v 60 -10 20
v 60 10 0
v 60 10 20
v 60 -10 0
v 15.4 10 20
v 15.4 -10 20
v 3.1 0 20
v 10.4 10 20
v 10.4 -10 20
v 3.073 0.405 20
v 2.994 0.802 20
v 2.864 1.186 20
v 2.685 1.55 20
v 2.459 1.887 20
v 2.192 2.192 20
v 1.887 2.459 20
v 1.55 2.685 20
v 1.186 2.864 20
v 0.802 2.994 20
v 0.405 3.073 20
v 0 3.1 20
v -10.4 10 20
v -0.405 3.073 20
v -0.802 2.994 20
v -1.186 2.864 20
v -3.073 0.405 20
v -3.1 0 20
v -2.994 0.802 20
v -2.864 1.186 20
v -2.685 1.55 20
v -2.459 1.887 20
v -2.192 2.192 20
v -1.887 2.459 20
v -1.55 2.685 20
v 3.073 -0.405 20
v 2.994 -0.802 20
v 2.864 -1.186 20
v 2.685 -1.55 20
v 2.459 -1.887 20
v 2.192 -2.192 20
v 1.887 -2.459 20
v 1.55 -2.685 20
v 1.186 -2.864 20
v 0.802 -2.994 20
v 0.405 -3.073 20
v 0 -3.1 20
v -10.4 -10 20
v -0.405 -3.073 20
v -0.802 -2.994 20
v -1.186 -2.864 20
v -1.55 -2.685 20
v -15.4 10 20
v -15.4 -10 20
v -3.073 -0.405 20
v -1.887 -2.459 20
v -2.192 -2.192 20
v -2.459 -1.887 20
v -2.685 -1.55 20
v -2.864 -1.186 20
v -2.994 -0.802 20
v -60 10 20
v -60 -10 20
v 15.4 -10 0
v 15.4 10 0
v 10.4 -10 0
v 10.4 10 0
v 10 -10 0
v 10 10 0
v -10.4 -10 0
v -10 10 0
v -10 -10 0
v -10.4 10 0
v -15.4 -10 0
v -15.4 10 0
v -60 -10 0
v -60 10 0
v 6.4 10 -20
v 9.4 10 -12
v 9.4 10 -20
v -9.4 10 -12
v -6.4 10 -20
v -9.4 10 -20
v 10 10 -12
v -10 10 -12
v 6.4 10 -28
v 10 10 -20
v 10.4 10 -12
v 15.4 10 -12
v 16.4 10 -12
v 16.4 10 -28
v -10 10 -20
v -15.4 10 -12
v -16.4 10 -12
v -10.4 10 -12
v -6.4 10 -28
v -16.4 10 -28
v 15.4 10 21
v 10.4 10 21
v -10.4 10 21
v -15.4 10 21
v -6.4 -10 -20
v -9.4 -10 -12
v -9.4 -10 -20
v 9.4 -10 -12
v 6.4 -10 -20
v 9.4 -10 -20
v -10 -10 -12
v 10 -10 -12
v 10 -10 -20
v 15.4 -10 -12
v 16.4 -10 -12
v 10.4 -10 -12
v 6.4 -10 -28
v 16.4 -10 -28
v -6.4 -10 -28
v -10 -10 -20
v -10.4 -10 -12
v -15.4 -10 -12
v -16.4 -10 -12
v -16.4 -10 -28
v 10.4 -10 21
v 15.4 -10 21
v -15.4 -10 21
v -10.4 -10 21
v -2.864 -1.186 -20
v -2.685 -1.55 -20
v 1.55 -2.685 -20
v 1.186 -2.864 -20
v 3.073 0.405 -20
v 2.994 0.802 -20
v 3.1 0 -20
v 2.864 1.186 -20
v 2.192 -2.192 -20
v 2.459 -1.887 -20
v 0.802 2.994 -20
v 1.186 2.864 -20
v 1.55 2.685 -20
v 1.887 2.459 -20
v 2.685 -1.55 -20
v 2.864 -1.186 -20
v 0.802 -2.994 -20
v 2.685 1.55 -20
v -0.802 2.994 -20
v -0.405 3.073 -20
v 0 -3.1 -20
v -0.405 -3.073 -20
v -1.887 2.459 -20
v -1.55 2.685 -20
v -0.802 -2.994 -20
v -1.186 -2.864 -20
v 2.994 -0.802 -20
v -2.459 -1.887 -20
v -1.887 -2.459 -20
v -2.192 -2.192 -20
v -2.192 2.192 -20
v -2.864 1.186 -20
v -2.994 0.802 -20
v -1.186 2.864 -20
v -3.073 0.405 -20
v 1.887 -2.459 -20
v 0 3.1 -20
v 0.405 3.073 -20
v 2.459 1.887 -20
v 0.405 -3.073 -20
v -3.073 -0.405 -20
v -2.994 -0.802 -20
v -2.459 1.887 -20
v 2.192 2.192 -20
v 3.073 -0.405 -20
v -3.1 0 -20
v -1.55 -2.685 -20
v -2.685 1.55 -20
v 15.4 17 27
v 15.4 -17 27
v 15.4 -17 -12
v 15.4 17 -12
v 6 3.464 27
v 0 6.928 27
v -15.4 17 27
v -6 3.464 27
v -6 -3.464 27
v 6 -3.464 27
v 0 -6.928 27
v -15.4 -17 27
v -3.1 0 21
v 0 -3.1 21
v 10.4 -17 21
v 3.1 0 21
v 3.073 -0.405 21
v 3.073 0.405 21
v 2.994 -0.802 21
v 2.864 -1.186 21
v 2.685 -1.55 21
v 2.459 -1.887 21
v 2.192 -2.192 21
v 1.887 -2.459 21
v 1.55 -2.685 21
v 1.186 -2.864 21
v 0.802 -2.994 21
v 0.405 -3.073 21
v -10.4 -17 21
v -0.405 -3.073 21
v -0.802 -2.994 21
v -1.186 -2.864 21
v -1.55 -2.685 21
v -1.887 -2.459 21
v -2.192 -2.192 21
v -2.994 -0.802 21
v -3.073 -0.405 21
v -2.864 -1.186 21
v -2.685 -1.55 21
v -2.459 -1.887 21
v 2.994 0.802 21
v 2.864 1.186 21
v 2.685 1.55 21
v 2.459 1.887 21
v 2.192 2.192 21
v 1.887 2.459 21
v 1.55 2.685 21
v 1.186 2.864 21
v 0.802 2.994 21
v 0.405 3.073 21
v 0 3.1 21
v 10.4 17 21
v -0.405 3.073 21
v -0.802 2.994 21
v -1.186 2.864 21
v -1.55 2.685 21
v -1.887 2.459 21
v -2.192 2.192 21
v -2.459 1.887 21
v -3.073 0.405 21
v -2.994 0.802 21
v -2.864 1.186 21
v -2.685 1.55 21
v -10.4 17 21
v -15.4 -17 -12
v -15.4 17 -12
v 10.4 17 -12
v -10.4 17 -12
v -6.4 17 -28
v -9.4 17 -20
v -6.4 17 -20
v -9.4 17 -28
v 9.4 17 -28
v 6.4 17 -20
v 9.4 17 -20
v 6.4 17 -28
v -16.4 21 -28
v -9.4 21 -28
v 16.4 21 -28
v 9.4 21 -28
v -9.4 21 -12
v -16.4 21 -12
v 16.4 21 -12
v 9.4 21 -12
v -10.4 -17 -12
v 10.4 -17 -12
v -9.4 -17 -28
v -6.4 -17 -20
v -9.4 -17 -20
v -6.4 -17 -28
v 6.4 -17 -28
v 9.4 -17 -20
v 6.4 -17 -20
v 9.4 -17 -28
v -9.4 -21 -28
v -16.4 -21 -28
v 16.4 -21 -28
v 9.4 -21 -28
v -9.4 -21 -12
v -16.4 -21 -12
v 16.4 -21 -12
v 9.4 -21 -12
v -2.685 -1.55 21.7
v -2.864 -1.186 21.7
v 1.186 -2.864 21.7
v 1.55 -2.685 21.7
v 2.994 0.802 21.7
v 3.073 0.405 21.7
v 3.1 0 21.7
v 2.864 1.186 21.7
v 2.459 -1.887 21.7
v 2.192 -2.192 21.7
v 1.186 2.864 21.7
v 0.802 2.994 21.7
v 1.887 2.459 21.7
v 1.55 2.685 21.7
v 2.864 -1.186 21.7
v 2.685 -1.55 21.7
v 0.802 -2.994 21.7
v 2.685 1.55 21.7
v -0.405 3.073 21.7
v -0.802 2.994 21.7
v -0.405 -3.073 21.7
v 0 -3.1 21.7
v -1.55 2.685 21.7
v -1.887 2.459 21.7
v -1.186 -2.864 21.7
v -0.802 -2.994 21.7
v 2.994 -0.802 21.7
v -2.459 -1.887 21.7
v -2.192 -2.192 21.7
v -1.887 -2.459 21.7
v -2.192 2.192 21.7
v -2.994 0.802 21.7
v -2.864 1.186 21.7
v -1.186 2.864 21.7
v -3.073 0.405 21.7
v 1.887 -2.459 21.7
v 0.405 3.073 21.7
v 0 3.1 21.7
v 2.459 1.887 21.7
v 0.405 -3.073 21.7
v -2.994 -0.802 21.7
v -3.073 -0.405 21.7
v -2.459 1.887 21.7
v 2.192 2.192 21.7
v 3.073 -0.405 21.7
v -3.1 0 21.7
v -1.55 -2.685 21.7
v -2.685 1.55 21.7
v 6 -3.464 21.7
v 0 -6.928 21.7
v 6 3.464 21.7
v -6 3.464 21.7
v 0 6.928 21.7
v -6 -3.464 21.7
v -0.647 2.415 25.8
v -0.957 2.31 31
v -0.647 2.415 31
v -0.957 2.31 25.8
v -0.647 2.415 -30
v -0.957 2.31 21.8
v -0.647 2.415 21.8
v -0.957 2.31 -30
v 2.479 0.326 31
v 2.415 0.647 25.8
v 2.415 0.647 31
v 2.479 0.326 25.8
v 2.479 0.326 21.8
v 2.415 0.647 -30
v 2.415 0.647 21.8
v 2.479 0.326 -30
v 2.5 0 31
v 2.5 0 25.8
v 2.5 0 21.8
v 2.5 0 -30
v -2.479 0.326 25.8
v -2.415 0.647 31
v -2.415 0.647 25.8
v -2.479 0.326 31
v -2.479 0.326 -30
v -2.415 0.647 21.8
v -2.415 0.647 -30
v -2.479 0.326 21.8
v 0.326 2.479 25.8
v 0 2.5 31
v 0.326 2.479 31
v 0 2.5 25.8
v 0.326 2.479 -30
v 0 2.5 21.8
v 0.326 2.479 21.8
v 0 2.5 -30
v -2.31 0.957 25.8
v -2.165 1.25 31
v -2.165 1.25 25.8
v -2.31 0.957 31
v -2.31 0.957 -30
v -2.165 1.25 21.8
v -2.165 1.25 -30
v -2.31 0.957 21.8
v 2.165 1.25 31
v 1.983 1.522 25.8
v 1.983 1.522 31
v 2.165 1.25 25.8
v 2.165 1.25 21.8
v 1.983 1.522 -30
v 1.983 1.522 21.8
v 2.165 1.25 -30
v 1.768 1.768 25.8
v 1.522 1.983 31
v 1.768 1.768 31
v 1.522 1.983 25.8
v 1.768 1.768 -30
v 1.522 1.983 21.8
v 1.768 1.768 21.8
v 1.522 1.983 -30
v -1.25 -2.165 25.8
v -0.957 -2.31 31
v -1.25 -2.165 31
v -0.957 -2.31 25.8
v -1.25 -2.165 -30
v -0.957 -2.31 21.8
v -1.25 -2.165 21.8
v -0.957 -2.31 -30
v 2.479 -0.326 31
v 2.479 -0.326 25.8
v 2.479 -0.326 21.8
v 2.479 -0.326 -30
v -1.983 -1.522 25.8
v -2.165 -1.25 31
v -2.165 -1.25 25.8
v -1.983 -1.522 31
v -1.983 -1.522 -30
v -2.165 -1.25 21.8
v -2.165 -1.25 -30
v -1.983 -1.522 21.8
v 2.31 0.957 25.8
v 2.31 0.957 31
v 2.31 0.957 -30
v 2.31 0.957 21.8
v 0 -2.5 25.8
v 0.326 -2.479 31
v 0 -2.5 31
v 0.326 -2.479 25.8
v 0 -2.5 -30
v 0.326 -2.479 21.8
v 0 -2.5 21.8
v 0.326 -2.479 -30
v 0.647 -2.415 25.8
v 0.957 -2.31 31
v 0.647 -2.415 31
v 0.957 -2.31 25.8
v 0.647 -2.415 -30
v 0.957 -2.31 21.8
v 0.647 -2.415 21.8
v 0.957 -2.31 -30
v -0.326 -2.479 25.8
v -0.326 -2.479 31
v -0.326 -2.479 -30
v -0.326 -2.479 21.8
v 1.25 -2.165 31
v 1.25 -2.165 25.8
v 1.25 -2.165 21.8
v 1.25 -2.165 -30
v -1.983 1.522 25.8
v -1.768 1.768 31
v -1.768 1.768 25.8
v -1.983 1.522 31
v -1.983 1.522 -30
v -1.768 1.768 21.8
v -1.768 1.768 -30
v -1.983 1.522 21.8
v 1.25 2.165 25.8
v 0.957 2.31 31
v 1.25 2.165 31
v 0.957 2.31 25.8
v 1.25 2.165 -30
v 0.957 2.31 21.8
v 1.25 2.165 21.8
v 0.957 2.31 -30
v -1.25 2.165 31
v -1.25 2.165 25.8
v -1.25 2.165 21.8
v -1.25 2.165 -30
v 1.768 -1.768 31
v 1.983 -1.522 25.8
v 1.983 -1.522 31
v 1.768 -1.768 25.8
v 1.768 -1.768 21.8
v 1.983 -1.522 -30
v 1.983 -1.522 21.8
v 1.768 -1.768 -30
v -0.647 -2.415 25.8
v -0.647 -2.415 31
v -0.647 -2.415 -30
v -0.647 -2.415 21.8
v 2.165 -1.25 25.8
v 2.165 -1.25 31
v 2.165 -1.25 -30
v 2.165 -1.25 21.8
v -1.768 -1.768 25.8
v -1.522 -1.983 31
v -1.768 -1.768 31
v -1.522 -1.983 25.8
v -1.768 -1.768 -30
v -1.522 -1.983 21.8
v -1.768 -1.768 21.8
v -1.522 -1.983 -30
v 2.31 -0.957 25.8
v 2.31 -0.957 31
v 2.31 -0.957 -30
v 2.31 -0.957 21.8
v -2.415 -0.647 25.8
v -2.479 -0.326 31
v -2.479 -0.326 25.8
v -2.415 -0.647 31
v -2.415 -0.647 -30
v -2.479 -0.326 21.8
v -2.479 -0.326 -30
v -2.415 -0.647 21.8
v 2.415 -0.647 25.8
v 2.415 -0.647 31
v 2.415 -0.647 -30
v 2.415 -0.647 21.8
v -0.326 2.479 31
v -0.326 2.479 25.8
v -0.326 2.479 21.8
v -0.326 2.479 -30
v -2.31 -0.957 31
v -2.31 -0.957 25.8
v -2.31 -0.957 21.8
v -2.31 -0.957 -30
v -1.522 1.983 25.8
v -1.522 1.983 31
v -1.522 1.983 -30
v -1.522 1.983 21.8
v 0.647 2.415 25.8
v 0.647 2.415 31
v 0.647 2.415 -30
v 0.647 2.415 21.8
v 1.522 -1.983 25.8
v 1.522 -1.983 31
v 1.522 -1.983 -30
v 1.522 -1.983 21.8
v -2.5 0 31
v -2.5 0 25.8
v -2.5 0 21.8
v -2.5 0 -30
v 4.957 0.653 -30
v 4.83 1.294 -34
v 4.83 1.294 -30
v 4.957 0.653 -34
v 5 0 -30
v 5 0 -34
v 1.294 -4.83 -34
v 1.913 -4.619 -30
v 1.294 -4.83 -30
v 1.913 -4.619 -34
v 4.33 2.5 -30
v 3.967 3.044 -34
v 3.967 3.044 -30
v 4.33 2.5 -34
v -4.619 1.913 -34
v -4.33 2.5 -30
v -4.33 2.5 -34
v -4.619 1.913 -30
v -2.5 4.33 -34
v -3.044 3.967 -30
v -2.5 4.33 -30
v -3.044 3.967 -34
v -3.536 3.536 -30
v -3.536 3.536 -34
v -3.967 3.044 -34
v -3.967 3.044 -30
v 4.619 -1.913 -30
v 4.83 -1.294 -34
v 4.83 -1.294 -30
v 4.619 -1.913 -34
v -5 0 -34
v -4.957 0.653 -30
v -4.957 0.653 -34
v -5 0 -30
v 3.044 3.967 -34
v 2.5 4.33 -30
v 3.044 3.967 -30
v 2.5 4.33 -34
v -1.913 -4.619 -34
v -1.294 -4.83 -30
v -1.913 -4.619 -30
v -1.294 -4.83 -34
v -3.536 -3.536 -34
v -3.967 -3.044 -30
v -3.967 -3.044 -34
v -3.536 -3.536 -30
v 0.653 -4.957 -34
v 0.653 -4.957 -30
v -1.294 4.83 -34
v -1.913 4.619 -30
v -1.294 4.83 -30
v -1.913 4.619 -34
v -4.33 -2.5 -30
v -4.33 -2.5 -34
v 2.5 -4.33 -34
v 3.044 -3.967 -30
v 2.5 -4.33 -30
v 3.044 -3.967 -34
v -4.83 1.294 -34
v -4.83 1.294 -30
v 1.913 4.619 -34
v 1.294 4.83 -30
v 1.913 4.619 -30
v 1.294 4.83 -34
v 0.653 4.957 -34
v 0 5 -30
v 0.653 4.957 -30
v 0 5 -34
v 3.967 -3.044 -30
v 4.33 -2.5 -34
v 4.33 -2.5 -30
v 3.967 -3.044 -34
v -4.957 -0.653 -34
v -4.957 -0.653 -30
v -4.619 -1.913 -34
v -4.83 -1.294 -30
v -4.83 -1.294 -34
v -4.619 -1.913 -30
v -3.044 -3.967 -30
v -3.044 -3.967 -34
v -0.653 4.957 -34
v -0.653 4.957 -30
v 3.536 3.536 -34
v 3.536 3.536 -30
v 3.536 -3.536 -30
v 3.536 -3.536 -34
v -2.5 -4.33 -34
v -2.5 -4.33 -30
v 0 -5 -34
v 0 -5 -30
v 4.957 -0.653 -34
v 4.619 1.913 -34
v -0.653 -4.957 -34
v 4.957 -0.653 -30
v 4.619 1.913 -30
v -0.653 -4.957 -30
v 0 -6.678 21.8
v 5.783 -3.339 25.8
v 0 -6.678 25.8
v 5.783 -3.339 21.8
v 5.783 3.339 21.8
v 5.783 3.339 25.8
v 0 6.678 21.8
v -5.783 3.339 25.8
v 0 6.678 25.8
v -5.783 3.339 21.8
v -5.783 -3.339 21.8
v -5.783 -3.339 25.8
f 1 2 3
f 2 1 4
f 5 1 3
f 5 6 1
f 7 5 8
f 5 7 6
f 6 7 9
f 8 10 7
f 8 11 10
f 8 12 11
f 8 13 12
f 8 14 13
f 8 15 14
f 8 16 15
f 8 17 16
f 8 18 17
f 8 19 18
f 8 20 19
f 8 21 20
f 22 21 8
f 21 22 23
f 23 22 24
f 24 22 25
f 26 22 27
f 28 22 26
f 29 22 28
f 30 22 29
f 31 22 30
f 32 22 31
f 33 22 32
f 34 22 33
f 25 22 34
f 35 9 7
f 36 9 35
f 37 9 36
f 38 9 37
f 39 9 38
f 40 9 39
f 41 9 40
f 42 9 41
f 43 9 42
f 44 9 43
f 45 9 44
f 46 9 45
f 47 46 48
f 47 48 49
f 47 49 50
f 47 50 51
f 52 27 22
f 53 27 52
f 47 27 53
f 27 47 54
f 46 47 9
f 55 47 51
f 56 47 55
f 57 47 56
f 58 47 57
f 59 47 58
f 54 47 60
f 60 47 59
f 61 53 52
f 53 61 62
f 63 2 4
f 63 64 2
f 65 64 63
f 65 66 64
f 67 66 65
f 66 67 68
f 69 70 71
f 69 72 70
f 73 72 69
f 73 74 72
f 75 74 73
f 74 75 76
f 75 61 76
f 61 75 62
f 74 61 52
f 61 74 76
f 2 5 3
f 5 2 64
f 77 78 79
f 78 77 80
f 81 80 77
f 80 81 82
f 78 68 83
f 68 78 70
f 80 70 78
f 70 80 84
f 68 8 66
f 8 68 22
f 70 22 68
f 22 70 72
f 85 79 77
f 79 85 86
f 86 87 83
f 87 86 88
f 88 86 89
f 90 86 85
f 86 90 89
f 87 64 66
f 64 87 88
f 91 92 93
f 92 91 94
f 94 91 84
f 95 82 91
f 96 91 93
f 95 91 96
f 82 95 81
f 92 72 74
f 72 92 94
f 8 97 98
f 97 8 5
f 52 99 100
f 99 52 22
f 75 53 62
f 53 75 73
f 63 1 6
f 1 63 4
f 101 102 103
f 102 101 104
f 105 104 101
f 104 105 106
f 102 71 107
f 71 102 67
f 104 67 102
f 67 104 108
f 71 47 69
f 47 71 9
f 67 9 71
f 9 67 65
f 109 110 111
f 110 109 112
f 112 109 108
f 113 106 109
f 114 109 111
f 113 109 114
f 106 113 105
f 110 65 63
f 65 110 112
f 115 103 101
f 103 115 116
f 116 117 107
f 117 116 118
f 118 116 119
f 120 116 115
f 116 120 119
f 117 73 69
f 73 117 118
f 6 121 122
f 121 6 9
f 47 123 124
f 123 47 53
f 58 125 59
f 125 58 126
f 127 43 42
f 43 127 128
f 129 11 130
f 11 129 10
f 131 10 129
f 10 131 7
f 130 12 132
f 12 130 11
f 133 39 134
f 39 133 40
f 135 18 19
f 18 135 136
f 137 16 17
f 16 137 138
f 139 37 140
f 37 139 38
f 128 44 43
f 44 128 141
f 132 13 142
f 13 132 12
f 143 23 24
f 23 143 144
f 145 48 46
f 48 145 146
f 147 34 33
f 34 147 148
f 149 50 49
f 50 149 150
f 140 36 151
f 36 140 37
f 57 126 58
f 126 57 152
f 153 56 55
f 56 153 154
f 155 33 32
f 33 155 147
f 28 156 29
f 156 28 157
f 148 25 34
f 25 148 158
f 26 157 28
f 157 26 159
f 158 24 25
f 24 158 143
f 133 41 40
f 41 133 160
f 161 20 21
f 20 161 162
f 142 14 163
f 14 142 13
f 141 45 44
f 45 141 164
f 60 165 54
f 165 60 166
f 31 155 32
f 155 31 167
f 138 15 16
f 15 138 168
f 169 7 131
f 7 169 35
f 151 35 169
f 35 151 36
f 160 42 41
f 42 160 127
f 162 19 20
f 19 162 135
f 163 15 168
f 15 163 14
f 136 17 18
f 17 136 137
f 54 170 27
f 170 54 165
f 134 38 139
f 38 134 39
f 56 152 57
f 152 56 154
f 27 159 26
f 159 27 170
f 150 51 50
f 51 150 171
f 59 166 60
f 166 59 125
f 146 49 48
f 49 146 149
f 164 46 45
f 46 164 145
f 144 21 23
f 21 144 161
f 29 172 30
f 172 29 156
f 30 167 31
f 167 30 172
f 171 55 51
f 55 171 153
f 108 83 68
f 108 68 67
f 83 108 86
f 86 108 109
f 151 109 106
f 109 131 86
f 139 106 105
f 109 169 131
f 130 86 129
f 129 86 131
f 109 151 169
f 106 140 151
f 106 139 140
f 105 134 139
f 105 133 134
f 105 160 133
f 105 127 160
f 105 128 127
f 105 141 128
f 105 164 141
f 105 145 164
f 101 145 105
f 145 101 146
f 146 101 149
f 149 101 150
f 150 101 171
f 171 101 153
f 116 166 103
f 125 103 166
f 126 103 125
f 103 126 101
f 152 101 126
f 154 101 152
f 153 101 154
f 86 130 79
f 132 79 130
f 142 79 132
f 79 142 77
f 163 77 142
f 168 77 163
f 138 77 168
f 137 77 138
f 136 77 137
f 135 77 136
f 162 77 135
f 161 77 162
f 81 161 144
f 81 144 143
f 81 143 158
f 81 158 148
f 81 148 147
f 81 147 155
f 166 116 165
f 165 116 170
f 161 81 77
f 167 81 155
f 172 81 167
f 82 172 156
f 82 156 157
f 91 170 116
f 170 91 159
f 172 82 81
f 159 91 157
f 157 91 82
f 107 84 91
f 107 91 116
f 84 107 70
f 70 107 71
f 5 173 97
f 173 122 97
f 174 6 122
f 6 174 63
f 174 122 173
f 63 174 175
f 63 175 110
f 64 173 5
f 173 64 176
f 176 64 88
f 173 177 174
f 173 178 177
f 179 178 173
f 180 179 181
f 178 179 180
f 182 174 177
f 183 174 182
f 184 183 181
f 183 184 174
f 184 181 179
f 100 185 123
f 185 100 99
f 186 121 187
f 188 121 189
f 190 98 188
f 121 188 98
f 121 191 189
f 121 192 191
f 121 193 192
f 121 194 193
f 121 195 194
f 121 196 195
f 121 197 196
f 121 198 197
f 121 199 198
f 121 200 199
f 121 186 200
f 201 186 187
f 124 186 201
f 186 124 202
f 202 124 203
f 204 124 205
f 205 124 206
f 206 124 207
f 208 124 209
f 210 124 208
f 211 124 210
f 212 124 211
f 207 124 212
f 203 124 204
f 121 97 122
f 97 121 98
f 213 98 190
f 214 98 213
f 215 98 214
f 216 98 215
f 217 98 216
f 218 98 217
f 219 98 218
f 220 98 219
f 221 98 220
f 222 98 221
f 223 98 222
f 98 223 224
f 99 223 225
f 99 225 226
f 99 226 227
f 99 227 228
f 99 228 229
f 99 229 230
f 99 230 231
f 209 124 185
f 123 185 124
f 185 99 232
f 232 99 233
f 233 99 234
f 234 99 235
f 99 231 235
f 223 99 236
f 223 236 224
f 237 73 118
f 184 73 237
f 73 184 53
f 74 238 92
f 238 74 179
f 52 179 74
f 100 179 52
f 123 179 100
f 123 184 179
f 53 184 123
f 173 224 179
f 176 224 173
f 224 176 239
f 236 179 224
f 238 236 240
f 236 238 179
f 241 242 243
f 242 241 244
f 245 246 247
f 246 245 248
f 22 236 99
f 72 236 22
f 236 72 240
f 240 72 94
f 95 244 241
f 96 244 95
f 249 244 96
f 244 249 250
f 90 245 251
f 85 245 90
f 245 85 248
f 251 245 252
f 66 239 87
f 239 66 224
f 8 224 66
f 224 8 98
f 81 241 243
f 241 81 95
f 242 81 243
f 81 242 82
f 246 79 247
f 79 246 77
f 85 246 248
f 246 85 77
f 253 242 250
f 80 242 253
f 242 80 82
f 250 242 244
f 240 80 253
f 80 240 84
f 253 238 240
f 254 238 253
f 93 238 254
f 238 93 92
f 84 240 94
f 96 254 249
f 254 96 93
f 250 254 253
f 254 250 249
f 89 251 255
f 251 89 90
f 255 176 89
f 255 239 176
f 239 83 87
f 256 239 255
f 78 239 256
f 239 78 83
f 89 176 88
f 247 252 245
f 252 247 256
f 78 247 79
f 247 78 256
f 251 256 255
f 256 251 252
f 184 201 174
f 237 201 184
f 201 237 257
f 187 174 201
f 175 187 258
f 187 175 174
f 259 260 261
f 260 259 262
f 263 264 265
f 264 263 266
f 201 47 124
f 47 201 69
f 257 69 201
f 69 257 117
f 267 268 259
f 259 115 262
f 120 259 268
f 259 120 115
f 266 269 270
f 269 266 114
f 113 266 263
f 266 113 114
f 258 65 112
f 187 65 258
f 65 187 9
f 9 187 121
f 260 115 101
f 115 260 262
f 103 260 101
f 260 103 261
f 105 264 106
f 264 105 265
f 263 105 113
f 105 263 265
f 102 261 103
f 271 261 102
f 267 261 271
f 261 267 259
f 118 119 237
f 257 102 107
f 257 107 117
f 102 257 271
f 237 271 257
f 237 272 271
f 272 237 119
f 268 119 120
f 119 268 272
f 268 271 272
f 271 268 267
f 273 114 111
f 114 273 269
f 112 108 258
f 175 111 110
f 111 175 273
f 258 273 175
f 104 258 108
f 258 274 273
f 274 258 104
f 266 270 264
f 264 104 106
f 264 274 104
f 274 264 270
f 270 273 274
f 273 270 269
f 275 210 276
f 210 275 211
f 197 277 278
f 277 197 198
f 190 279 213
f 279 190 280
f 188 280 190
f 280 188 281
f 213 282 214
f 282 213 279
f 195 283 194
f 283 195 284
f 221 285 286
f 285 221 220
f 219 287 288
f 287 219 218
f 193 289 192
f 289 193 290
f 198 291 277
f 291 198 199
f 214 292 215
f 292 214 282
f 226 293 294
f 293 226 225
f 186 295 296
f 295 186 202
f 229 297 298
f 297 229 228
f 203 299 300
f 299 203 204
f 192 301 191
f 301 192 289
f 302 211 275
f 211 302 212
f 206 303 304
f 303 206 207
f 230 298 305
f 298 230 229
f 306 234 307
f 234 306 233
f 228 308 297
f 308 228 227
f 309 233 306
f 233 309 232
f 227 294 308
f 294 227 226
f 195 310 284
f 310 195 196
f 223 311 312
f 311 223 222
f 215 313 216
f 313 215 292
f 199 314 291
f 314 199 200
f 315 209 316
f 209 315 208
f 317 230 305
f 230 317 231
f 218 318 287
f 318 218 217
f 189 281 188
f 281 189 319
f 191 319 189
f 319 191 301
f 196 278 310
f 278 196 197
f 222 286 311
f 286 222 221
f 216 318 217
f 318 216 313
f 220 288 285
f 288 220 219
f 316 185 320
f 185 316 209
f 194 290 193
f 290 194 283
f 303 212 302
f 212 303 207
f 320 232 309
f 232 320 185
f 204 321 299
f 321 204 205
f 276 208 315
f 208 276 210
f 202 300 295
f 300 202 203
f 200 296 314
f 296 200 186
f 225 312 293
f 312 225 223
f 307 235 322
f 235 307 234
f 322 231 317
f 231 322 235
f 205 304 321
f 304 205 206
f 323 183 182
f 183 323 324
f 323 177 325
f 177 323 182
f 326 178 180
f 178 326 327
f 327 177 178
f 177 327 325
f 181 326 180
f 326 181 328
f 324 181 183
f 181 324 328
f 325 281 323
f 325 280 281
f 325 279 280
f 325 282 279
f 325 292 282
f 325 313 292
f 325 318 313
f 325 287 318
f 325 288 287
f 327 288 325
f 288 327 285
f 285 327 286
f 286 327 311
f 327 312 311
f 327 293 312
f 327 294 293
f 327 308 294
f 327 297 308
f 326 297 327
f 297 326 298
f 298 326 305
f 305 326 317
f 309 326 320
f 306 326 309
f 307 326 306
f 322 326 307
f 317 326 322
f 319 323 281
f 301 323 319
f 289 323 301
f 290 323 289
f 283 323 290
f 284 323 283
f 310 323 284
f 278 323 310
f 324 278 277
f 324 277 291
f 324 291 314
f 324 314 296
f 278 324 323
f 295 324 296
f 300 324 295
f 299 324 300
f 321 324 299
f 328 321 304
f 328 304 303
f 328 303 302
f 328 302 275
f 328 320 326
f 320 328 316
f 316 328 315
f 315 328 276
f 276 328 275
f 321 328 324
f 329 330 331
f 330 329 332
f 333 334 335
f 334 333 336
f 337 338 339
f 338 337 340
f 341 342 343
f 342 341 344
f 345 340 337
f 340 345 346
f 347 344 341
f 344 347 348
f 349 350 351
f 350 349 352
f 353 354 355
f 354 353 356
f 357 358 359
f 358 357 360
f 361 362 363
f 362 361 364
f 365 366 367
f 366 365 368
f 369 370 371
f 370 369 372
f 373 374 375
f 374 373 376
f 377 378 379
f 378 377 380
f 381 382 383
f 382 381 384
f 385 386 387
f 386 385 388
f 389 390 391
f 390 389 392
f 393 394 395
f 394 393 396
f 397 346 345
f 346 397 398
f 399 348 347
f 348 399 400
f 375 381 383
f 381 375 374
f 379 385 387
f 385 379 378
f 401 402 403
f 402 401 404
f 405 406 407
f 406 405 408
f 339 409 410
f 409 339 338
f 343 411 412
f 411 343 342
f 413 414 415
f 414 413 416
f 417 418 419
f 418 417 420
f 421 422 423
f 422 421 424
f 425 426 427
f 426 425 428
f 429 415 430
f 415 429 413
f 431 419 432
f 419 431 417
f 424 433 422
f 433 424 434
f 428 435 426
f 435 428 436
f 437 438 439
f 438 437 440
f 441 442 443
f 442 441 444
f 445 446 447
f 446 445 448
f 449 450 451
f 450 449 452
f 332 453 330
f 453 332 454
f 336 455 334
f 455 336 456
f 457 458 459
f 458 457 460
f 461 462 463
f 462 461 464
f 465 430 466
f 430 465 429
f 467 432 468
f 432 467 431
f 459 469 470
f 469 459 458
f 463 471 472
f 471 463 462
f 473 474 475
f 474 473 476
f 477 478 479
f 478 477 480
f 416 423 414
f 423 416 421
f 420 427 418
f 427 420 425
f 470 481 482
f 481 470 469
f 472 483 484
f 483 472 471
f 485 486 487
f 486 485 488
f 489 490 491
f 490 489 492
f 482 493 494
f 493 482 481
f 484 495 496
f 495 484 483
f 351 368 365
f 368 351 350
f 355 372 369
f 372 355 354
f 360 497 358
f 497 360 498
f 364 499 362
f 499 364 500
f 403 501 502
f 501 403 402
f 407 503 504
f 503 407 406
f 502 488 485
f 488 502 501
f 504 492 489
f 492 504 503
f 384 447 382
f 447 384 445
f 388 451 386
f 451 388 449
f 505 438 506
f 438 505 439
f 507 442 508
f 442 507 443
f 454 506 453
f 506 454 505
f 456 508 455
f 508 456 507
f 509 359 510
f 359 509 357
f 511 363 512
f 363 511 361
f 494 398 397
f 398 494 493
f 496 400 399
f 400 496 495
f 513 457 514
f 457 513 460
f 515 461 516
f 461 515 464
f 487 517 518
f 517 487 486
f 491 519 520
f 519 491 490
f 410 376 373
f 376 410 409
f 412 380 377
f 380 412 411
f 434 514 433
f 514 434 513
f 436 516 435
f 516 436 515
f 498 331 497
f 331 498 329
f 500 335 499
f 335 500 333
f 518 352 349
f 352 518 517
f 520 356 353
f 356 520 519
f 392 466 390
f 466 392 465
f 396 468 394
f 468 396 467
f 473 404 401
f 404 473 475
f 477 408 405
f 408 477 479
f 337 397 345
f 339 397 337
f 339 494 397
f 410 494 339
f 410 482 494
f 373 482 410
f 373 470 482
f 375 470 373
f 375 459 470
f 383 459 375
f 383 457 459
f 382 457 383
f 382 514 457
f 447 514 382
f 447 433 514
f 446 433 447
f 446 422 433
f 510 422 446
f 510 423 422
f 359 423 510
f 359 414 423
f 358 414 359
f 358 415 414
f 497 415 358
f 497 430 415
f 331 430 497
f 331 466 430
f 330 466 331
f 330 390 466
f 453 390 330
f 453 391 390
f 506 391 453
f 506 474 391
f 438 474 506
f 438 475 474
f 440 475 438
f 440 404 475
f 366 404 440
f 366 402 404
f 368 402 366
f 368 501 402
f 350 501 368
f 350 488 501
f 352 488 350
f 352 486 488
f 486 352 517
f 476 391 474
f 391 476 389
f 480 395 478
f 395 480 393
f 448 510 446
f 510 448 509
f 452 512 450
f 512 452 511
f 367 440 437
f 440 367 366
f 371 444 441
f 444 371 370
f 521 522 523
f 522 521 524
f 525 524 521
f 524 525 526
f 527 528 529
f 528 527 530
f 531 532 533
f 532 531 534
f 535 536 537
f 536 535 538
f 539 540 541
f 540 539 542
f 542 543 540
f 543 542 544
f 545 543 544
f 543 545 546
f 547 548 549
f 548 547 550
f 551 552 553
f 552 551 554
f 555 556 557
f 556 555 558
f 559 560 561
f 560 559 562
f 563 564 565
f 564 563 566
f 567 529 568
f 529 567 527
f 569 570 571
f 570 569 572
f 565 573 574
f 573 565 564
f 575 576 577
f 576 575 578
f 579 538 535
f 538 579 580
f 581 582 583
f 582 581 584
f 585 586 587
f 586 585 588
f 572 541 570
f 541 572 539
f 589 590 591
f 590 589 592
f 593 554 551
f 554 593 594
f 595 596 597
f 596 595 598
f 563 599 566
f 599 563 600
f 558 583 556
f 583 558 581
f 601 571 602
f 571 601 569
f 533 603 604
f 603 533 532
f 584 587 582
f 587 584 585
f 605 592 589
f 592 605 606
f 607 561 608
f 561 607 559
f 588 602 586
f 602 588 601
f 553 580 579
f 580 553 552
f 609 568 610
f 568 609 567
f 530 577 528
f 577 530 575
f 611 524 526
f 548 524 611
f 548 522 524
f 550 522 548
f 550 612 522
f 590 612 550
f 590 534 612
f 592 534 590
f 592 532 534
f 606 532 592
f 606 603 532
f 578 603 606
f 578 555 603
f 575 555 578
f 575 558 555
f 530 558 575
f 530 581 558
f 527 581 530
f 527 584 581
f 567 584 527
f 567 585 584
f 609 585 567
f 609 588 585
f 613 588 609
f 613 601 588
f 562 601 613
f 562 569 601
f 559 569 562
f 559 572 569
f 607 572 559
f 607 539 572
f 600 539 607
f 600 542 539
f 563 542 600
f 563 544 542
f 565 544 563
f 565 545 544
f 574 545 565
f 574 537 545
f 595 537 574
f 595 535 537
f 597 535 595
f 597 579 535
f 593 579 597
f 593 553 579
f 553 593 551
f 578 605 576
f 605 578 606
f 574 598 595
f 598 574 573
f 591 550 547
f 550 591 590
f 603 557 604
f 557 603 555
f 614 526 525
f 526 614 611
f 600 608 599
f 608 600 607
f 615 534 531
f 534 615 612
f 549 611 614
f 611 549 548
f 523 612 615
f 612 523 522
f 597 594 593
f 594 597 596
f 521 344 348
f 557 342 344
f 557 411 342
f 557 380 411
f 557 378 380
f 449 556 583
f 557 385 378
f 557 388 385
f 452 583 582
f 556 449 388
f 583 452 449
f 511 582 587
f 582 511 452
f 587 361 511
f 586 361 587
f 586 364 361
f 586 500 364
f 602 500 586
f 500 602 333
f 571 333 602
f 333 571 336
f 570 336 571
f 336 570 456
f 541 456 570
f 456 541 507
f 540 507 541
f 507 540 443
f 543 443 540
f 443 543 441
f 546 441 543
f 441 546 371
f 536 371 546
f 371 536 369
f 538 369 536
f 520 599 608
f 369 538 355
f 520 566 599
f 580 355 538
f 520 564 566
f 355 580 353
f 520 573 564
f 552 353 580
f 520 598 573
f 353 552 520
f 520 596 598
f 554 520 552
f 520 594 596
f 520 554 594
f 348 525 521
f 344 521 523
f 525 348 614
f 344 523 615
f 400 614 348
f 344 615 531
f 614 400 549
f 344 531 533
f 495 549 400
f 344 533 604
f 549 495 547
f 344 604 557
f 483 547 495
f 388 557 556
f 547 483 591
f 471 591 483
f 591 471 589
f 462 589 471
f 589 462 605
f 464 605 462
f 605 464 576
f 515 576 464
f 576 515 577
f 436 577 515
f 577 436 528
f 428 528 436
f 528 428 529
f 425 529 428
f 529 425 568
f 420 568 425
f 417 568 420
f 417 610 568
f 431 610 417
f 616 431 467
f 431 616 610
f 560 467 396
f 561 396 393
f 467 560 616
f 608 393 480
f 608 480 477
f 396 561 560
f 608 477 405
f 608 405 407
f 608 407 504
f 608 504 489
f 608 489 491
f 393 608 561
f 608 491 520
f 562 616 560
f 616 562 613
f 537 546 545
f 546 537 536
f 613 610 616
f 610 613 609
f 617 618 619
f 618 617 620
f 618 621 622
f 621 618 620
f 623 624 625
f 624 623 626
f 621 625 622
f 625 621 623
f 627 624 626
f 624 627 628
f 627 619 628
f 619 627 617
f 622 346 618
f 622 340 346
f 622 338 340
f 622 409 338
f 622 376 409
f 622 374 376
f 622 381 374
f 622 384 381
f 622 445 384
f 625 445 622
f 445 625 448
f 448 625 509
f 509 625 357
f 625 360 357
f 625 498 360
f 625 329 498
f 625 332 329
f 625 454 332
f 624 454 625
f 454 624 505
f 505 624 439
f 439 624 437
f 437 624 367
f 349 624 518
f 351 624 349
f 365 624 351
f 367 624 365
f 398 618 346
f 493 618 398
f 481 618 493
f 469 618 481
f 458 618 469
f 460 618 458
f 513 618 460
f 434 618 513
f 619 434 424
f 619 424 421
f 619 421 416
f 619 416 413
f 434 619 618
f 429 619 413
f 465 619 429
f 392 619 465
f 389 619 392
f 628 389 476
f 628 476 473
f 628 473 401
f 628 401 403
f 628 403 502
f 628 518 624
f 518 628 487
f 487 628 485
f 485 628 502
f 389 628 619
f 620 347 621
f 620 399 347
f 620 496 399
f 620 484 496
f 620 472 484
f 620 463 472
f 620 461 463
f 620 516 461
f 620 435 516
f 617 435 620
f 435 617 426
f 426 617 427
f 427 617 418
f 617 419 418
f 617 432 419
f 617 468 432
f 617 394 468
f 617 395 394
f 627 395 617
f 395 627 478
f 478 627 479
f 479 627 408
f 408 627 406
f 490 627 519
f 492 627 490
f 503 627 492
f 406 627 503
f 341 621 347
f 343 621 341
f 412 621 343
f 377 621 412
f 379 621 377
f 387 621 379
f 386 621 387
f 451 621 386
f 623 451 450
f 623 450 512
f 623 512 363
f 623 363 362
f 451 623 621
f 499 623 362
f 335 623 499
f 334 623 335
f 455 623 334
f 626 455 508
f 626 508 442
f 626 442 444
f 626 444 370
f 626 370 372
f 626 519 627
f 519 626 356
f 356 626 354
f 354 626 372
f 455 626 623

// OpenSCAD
// Pingpang-SmartGear — one-piece double-U joint guard, v0.3
//
// Mechanical contract for this correction:
//   x = barrier long direction
//   y = front/back direction
//   z = vertical direction
//
// The printed part is ONE solid.  It contains a front U and a back U, joined
// by one printed top yoke.  The clear distance between the two U inner faces
// is exactly 20 mm.  There is no male/female printed connection and no second
// printed part to bolt together.
//
// The context tubes are the local joint envelope:
//   upper long 20x20 tube: axis x, z=0..20
//   lower perpendicular 20x20 tube: axis y, z=-20..0
// They touch at z=0 and share a vertical screw axis through their centre.

$fn = 48;

PART = "assembly_iso";

// ---------- fixed interface dimensions ----------
tube = 20;
u_inner_distance_y = 20;       // hard requirement: inner face to inner face
u_clearance_x = 0.8;           // only the x direction has initial PETG relief
u_inner_width_x = tube + u_clearance_x;
wall = 5.0;
u_outer_width_x = u_inner_width_x + 2 * wall;

front_y_inner = u_inner_distance_y / 2;
plate_depth_y = 7.0;           // stronger front/back cheek depth
front_y_outer = front_y_inner + plate_depth_y;
back_y_outer = -front_y_outer;
back_y_inner = -front_y_inner;

u_bottom = -28;
u_top = 27;
top_yoke_thickness = 6.0;
hook_depth_x = 6.5;
hook_height_z = 8.0;

// The lower wrap is extended outward in y beyond the normal U plate.  This
// makes the part reach farther front/back around the lower foot while the
// two inner faces remain exactly 20 mm apart.
lower_cheek_extra_y = 4.0;
lower_cheek_height_z = 16.0;
lower_cheek_width_x = wall + 2.0;

// Vertical screw relief.  This is a clearance hole, never a printed thread;
// the actual M4/M5 screw and nut/tapped tube remain external hardware.
screw_clearance_d = 6.2;

// Full top nut envelope.  The socket is intentionally larger than an M5 AF8
// nut and deeper than a typical 4 mm nut, so the nut cannot touch the top
// surface when the screw is tightened.
nut_pocket_af = 12.0;
nut_pocket_depth = 5.2;
nut_height = 4.0;

assert(u_inner_distance_y == 20, "双 U 内距离必须保持 20 mm");

// ---------- helpers ----------
module box_at(xc, yc, zc, sx, sy, sz) {
    translate([xc, yc, zc]) cube([sx, sy, sz], center = true);
}

module u_plate(y0, y1) {
    depth = y1 - y0;
    yc = (y0 + y1) / 2;
    left_x = -u_outer_width_x / 2 + wall / 2;
    right_x = u_outer_width_x / 2 - wall / 2;
    lip_z = u_bottom + hook_height_z / 2;
    left_lip_x = -u_outer_width_x / 2 + wall / 2 + hook_depth_x / 2;
    right_lip_x = u_outer_width_x / 2 - wall / 2 - hook_depth_x / 2;
    front_side = y0 > 0;
    cheek_y0 = front_side ? y0 : y0 - lower_cheek_extra_y;
    cheek_y1 = front_side ? y1 + lower_cheek_extra_y : y1;
    cheek_yc = (cheek_y0 + cheek_y1) / 2;
    cheek_zc = u_bottom + lower_cheek_height_z / 2;

    union() {
        // U top and two continuous arms.
        box_at(0, yc, u_top - top_yoke_thickness / 2,
               u_outer_width_x, depth, top_yoke_thickness);
        box_at(left_x, yc, (u_top + u_bottom) / 2,
               wall, depth, u_top - u_bottom);
        box_at(right_x, yc, (u_top + u_bottom) / 2,
               wall, depth, u_top - u_bottom);

        // Inward lower hooks: the actual anti-rotation retaining feature.
        box_at(left_lip_x, yc, lip_z,
               hook_depth_x, depth, hook_height_z);
        box_at(right_lip_x, yc, lip_z,
               hook_depth_x, depth, hook_height_z);

        // Thickened lower cheeks extend outward in y and reinforce the hook
        // roots.  They do not reduce the 20 mm inner distance.
        box_at(left_x, cheek_yc, cheek_zc,
               lower_cheek_width_x, cheek_y1 - cheek_y0, lower_cheek_height_z);
        box_at(right_x, cheek_yc, cheek_zc,
               lower_cheek_width_x, cheek_y1 - cheek_y0, lower_cheek_height_z);
    }
}

module printed_yokes() {
    // The top yoke joins the top bridges of both U plates into one roof.
    // The lower mouths remain open so the front/back silhouettes stay U-shaped.
    box_at(0, 0, u_top - top_yoke_thickness / 2,
           u_outer_width_x, 2 * front_y_outer, top_yoke_thickness);
}

module vertical_screw_relief() {
    // Full z-axis clearance through the printed top yoke.  There is no printed
    // material in the middle gap, so this does not create a hidden horizontal
    // tunnel or a self-intersecting connector.  The screw approaches from
    // below, passes through the two tube sections, and exits this top yoke.
    translate([0, 0, (u_bottom + u_top) / 2])
        cylinder(d = screw_clearance_d,
                 h = (u_top - u_bottom) + 8,
                 center = true);

    // Hexagonal pocket opens from the top face.  Across-flats clearance is
    // deliberately generous; the remaining floor keeps the nut captured.
    translate([0, 0, u_top - nut_pocket_depth / 2])
        rotate([0, 0, 30])
            cylinder(r = nut_pocket_af / (2 * cos(30)),
                     h = nut_pocket_depth + 0.2,
                     center = true,
                     $fn = 6);
}

module double_u_clip() {
    difference() {
        union() {
            // Front U: inner face y=+10, outer face y=+14.
            u_plate(front_y_inner, front_y_outer);

            // Back U: inner face y=-10, outer face y=-14.
            u_plate(back_y_outer, back_y_inner);

            printed_yokes();
        }
        vertical_screw_relief();
    }
}

// ---------- context envelope for preview only ----------
module vertical_bore() {
    translate([0, 0, 0])
        cylinder(d = screw_clearance_d, h = 60, center = true);
}

module upper_long_tube() {
    color([0.58, 0.61, 0.66])
        difference() {
            translate([0, 0, tube / 2])
                cube([120, tube, tube], center = true);
            vertical_bore();
        }
}

module lower_cross_tube() {
    // This is the local 20 mm joint section between the two U inner faces.
    color([0.28, 0.45, 0.78])
        difference() {
            translate([0, 0, -tube / 2])
                cube([tube, u_inner_distance_y, tube], center = true);
            vertical_bore();
        }
}

module vertical_joint_screw() {
    color([0.82, 0.82, 0.84])
        translate([0, 0, 0])
            cylinder(d = 5.0, h = 62, center = true);

    // Screw head below the lower yoke.
    color([0.92, 0.70, 0.12])
        translate([0, 0, u_bottom - 4])
            cylinder(d = 10.0, h = 4.0, center = true);

    // The nut sits inside the recessed top pocket, below the top surface.
    color([0.92, 0.70, 0.12])
        translate([0, 0, u_top - nut_pocket_depth + nut_height / 2])
            rotate([0, 0, 30])
                cylinder(r = nut_pocket_af / (2 * cos(30)) - 0.25,
                         h = nut_height,
                         center = true,
                         $fn = 6);
}

module assembly_iso() {
    upper_long_tube();
    lower_cross_tube();
    color([0.96, 0.39, 0.08]) double_u_clip();
    vertical_joint_screw();
}

module assembly_section() {
    // Cut the positive-x half to expose the vertical hole and the 20 mm gap.
    intersection() {
        assembly_iso();
        translate([0, -100, -100]) cube([100, 200, 200]);
    }
}

module clip_front() {
    double_u_clip();
}

module clip_bottom() {
    double_u_clip();
}

module clip_top() {
    double_u_clip();
}

module clip_print_orientation() {
    // One-piece print orientation.  The y envelope is placed on z=0.
    translate([0, 0, front_y_outer])
        rotate([90, 0, 0]) double_u_clip();
}

if (PART == "clip") {
    double_u_clip();
} else if (PART == "clip_print_orientation") {
    clip_print_orientation();
} else if (PART == "assembly_section") {
    assembly_section();
} else if (PART == "clip_front") {
    clip_front();
} else if (PART == "clip_bottom") {
    clip_bottom();
} else if (PART == "clip_top") {
    clip_top();
} else {
    assembly_iso();
}
